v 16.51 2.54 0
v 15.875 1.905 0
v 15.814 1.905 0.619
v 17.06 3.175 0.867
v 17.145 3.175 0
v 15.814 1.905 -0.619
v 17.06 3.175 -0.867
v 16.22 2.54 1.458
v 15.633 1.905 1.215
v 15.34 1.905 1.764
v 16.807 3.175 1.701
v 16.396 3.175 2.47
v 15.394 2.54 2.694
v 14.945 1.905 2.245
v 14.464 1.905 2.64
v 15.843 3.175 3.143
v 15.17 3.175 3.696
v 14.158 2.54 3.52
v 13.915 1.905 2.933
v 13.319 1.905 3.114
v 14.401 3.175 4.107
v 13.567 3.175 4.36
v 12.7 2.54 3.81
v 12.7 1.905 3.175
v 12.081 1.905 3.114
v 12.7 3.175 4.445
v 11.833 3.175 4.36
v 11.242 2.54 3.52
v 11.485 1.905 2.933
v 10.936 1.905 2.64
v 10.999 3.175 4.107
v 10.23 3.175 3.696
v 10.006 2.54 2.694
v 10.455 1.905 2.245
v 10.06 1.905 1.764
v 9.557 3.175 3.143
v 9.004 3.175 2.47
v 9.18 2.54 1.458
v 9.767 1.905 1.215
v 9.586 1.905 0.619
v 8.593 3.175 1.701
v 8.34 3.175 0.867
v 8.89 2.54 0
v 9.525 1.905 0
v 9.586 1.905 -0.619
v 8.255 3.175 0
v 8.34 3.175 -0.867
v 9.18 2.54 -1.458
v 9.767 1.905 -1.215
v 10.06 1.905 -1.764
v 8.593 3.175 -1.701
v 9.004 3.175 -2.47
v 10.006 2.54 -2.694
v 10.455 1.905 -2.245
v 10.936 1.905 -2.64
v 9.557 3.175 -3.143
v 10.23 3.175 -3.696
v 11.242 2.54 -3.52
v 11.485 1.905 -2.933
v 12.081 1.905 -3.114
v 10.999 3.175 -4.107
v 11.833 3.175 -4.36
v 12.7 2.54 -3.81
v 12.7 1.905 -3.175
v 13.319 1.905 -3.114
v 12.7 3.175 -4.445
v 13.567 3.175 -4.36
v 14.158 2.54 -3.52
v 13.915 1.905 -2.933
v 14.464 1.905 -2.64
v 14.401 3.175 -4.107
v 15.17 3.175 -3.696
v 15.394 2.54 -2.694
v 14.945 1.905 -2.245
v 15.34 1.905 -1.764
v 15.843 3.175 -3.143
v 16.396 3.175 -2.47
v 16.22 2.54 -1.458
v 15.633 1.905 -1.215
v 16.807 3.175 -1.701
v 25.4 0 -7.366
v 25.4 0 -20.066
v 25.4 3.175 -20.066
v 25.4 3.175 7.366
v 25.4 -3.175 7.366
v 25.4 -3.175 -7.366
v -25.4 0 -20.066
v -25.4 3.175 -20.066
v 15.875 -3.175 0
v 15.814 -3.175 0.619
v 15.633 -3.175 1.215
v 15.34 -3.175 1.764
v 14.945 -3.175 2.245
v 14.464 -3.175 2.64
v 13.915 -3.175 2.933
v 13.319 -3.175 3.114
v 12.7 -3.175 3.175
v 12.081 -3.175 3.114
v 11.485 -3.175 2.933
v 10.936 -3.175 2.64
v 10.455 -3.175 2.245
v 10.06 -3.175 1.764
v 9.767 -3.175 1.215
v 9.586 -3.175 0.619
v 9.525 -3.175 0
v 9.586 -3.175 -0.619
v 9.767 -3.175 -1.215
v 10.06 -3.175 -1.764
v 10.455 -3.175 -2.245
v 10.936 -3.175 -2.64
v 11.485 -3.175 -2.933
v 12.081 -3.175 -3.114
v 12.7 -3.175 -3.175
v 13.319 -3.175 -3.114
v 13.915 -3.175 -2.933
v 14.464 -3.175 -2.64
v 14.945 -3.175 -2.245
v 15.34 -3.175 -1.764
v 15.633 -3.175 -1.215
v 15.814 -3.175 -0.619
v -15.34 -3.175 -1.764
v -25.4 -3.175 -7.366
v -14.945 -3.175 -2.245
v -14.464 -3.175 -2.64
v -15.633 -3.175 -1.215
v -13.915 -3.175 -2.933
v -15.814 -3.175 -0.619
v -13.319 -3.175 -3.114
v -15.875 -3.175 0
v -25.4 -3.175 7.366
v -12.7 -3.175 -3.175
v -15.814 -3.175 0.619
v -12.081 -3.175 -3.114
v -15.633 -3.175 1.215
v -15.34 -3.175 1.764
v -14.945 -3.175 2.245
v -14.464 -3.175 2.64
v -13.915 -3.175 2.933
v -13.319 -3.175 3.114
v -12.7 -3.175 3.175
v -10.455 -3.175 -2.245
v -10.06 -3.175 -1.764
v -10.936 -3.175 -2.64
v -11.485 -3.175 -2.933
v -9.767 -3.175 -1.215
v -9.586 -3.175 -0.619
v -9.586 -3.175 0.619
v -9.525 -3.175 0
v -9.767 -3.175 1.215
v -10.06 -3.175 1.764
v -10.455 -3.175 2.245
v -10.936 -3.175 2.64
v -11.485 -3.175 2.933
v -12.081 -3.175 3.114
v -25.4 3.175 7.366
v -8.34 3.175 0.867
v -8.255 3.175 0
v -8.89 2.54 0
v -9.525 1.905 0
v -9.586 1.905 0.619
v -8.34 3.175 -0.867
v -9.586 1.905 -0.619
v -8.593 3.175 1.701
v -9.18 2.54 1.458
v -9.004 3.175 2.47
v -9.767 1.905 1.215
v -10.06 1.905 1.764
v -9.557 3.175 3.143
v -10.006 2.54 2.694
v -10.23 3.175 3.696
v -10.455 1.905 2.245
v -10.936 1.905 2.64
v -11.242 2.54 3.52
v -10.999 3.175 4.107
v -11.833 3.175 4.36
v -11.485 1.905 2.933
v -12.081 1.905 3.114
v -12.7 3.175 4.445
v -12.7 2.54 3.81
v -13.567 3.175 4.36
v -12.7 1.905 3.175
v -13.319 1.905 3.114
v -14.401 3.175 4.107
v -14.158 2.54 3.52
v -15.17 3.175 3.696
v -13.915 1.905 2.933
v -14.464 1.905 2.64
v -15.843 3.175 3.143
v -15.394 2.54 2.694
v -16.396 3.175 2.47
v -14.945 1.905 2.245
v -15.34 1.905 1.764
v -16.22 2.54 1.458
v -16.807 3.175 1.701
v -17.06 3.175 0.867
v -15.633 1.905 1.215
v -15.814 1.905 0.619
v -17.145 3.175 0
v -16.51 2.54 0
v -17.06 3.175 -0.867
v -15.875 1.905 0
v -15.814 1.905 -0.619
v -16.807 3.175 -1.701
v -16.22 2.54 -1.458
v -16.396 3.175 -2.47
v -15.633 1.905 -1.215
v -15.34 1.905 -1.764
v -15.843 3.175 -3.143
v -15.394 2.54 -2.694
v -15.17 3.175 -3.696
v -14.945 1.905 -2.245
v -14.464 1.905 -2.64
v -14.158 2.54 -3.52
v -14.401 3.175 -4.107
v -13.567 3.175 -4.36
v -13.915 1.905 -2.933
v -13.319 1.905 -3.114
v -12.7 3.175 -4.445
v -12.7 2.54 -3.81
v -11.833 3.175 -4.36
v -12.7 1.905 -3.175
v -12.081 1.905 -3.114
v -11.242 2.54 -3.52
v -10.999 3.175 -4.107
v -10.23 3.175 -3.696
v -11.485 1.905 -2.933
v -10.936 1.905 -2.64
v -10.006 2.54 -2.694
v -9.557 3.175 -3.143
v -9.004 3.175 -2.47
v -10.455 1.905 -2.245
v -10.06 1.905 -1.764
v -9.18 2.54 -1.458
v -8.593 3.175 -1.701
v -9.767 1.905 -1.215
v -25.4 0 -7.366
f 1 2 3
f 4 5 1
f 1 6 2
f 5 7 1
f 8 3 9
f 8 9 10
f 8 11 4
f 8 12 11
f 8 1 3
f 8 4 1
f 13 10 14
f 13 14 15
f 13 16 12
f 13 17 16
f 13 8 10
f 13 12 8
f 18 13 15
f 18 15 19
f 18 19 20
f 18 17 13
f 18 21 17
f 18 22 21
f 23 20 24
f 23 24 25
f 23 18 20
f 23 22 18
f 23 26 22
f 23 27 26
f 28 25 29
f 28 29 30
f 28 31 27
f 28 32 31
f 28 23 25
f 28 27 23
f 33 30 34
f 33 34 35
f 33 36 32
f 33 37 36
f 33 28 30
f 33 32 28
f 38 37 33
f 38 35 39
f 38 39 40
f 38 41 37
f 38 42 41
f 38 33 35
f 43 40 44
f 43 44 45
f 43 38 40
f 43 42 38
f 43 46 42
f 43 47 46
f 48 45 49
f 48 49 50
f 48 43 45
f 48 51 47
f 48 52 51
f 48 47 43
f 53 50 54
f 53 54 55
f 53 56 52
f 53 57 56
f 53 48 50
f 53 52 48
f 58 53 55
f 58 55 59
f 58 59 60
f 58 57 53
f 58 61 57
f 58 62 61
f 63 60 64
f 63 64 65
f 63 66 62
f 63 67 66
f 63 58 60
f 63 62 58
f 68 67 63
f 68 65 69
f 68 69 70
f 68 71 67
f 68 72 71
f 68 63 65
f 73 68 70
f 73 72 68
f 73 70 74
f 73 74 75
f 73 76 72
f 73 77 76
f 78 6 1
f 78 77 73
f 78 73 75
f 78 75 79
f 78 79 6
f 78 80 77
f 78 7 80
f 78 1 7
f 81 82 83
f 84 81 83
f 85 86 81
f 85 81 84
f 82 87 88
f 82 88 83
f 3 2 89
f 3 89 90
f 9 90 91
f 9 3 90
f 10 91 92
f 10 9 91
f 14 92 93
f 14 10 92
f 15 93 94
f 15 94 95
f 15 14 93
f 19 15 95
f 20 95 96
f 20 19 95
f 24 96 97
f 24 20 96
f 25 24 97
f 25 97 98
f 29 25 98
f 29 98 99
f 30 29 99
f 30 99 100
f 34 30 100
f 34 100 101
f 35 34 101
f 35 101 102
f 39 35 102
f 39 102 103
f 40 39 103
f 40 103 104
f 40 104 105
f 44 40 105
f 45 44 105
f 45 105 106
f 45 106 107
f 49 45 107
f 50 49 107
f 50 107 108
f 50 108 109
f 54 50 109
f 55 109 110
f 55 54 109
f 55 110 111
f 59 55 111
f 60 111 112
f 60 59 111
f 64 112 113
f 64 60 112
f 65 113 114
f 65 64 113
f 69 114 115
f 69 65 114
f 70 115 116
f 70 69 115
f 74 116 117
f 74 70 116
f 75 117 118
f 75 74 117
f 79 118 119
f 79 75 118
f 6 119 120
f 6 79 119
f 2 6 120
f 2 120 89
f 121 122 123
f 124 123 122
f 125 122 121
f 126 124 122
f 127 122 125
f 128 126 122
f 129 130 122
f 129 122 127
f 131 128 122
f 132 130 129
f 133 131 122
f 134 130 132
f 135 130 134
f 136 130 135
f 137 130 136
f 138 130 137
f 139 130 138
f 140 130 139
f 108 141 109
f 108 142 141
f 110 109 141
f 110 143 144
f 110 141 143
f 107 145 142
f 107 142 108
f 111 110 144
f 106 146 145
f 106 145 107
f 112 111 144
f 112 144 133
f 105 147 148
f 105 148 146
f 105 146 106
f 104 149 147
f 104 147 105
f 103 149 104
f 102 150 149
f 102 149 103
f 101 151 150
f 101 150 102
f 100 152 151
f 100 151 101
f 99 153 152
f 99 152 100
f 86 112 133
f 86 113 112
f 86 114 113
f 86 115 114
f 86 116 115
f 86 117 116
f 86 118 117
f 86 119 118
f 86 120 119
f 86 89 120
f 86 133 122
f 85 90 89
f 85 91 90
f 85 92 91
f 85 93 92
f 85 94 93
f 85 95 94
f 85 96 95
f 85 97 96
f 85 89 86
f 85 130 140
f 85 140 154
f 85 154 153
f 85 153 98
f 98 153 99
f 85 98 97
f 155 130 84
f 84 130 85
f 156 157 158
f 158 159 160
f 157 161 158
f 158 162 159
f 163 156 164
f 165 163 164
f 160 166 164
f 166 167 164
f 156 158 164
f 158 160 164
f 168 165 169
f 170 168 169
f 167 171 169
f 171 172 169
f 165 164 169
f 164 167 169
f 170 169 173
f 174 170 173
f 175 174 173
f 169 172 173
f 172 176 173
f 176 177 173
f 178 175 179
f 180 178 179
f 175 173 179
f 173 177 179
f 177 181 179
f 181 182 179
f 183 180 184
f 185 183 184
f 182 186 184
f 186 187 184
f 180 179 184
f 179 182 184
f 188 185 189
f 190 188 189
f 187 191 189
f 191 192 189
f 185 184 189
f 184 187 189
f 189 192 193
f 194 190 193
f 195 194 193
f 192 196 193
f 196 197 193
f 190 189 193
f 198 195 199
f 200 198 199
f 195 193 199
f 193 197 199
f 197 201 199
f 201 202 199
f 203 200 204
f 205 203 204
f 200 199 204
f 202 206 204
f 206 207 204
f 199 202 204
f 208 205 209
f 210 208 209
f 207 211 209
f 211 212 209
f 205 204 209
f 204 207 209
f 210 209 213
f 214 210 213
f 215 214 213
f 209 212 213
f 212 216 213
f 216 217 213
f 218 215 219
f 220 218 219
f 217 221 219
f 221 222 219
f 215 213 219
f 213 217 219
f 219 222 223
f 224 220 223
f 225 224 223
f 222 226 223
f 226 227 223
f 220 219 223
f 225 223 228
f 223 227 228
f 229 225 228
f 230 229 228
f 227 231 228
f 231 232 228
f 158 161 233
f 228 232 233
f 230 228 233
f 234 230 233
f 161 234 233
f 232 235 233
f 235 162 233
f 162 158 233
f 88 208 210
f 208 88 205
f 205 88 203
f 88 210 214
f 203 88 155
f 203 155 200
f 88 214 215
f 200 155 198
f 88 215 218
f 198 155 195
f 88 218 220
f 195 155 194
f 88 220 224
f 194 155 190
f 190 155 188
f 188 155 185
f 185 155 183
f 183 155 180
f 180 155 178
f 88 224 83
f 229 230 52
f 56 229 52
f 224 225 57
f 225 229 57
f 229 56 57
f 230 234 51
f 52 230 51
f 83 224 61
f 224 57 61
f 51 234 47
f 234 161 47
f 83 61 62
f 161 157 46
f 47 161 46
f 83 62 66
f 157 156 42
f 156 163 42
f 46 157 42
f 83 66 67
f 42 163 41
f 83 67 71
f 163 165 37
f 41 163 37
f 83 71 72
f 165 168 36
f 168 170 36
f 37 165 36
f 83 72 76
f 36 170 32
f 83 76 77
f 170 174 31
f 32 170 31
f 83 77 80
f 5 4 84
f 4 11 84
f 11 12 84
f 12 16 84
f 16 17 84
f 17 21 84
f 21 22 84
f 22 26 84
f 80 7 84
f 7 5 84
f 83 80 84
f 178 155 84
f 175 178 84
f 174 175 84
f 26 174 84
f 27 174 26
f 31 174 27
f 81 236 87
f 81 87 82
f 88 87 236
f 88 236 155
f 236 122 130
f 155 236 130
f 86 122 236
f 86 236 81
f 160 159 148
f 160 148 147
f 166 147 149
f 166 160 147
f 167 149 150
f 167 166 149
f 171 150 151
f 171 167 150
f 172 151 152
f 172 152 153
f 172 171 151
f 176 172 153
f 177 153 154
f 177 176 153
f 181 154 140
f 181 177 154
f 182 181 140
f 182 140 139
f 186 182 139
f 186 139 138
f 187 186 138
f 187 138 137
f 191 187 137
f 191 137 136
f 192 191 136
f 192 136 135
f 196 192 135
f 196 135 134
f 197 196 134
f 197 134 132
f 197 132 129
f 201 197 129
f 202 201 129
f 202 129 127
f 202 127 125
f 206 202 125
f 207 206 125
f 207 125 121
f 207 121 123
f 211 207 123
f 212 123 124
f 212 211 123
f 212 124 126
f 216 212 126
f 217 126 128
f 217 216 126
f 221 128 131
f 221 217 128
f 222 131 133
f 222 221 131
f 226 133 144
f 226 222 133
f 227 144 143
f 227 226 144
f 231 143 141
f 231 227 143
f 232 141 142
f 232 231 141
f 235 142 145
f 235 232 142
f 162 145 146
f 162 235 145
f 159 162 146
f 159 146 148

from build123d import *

# Parameters (mm, degrees)
F0_W     = 50.8
F0_H     = 14.732
F0_R     = 3.175
F1_DEPTH = 3.175
F0_H_2   = 12.7
F2_DEPTH = 3.175
F3_SIZE2 = 1.27
F3_SIZE  = 1.27
F4_SIZE2 = 1.27
F4_SIZE  = 1.27


with BuildPart() as f1:
    # F0 (on Front) → F1 (new body, symmetric)
    with BuildSketch(Plane.XZ):
        Rectangle(F0_W, F0_H)
        with Locations((-12.7, 0)):
            Circle(F0_R, mode=Mode.SUBTRACT)
        with Locations((12.7, 0)):
            Circle(F0_R, mode=Mode.SUBTRACT)
    extrude(amount=F1_DEPTH, both=True)

    # F0 (on Front) → F2 (join)
    with BuildSketch(Plane.XZ):
        with Locations((0, -13.716)):
            Rectangle(F0_W, F0_H_2)
    extrude(amount=-F2_DEPTH)

    # F3
    f3_edges = [f1.edges().sort_by_distance(p)[0] for p in [
        (9.525, 3.175, 0),
    ]]
    chamfer(f3_edges, length=F3_SIZE, length2=F3_SIZE2)

    # F4
    f4_edges = [f1.edges().sort_by_distance(p)[0] for p in [
        (-15.875, 3.175, 0),
    ]]
    chamfer(f4_edges, length=F4_SIZE, length2=F4_SIZE2)


solid = f1.part
